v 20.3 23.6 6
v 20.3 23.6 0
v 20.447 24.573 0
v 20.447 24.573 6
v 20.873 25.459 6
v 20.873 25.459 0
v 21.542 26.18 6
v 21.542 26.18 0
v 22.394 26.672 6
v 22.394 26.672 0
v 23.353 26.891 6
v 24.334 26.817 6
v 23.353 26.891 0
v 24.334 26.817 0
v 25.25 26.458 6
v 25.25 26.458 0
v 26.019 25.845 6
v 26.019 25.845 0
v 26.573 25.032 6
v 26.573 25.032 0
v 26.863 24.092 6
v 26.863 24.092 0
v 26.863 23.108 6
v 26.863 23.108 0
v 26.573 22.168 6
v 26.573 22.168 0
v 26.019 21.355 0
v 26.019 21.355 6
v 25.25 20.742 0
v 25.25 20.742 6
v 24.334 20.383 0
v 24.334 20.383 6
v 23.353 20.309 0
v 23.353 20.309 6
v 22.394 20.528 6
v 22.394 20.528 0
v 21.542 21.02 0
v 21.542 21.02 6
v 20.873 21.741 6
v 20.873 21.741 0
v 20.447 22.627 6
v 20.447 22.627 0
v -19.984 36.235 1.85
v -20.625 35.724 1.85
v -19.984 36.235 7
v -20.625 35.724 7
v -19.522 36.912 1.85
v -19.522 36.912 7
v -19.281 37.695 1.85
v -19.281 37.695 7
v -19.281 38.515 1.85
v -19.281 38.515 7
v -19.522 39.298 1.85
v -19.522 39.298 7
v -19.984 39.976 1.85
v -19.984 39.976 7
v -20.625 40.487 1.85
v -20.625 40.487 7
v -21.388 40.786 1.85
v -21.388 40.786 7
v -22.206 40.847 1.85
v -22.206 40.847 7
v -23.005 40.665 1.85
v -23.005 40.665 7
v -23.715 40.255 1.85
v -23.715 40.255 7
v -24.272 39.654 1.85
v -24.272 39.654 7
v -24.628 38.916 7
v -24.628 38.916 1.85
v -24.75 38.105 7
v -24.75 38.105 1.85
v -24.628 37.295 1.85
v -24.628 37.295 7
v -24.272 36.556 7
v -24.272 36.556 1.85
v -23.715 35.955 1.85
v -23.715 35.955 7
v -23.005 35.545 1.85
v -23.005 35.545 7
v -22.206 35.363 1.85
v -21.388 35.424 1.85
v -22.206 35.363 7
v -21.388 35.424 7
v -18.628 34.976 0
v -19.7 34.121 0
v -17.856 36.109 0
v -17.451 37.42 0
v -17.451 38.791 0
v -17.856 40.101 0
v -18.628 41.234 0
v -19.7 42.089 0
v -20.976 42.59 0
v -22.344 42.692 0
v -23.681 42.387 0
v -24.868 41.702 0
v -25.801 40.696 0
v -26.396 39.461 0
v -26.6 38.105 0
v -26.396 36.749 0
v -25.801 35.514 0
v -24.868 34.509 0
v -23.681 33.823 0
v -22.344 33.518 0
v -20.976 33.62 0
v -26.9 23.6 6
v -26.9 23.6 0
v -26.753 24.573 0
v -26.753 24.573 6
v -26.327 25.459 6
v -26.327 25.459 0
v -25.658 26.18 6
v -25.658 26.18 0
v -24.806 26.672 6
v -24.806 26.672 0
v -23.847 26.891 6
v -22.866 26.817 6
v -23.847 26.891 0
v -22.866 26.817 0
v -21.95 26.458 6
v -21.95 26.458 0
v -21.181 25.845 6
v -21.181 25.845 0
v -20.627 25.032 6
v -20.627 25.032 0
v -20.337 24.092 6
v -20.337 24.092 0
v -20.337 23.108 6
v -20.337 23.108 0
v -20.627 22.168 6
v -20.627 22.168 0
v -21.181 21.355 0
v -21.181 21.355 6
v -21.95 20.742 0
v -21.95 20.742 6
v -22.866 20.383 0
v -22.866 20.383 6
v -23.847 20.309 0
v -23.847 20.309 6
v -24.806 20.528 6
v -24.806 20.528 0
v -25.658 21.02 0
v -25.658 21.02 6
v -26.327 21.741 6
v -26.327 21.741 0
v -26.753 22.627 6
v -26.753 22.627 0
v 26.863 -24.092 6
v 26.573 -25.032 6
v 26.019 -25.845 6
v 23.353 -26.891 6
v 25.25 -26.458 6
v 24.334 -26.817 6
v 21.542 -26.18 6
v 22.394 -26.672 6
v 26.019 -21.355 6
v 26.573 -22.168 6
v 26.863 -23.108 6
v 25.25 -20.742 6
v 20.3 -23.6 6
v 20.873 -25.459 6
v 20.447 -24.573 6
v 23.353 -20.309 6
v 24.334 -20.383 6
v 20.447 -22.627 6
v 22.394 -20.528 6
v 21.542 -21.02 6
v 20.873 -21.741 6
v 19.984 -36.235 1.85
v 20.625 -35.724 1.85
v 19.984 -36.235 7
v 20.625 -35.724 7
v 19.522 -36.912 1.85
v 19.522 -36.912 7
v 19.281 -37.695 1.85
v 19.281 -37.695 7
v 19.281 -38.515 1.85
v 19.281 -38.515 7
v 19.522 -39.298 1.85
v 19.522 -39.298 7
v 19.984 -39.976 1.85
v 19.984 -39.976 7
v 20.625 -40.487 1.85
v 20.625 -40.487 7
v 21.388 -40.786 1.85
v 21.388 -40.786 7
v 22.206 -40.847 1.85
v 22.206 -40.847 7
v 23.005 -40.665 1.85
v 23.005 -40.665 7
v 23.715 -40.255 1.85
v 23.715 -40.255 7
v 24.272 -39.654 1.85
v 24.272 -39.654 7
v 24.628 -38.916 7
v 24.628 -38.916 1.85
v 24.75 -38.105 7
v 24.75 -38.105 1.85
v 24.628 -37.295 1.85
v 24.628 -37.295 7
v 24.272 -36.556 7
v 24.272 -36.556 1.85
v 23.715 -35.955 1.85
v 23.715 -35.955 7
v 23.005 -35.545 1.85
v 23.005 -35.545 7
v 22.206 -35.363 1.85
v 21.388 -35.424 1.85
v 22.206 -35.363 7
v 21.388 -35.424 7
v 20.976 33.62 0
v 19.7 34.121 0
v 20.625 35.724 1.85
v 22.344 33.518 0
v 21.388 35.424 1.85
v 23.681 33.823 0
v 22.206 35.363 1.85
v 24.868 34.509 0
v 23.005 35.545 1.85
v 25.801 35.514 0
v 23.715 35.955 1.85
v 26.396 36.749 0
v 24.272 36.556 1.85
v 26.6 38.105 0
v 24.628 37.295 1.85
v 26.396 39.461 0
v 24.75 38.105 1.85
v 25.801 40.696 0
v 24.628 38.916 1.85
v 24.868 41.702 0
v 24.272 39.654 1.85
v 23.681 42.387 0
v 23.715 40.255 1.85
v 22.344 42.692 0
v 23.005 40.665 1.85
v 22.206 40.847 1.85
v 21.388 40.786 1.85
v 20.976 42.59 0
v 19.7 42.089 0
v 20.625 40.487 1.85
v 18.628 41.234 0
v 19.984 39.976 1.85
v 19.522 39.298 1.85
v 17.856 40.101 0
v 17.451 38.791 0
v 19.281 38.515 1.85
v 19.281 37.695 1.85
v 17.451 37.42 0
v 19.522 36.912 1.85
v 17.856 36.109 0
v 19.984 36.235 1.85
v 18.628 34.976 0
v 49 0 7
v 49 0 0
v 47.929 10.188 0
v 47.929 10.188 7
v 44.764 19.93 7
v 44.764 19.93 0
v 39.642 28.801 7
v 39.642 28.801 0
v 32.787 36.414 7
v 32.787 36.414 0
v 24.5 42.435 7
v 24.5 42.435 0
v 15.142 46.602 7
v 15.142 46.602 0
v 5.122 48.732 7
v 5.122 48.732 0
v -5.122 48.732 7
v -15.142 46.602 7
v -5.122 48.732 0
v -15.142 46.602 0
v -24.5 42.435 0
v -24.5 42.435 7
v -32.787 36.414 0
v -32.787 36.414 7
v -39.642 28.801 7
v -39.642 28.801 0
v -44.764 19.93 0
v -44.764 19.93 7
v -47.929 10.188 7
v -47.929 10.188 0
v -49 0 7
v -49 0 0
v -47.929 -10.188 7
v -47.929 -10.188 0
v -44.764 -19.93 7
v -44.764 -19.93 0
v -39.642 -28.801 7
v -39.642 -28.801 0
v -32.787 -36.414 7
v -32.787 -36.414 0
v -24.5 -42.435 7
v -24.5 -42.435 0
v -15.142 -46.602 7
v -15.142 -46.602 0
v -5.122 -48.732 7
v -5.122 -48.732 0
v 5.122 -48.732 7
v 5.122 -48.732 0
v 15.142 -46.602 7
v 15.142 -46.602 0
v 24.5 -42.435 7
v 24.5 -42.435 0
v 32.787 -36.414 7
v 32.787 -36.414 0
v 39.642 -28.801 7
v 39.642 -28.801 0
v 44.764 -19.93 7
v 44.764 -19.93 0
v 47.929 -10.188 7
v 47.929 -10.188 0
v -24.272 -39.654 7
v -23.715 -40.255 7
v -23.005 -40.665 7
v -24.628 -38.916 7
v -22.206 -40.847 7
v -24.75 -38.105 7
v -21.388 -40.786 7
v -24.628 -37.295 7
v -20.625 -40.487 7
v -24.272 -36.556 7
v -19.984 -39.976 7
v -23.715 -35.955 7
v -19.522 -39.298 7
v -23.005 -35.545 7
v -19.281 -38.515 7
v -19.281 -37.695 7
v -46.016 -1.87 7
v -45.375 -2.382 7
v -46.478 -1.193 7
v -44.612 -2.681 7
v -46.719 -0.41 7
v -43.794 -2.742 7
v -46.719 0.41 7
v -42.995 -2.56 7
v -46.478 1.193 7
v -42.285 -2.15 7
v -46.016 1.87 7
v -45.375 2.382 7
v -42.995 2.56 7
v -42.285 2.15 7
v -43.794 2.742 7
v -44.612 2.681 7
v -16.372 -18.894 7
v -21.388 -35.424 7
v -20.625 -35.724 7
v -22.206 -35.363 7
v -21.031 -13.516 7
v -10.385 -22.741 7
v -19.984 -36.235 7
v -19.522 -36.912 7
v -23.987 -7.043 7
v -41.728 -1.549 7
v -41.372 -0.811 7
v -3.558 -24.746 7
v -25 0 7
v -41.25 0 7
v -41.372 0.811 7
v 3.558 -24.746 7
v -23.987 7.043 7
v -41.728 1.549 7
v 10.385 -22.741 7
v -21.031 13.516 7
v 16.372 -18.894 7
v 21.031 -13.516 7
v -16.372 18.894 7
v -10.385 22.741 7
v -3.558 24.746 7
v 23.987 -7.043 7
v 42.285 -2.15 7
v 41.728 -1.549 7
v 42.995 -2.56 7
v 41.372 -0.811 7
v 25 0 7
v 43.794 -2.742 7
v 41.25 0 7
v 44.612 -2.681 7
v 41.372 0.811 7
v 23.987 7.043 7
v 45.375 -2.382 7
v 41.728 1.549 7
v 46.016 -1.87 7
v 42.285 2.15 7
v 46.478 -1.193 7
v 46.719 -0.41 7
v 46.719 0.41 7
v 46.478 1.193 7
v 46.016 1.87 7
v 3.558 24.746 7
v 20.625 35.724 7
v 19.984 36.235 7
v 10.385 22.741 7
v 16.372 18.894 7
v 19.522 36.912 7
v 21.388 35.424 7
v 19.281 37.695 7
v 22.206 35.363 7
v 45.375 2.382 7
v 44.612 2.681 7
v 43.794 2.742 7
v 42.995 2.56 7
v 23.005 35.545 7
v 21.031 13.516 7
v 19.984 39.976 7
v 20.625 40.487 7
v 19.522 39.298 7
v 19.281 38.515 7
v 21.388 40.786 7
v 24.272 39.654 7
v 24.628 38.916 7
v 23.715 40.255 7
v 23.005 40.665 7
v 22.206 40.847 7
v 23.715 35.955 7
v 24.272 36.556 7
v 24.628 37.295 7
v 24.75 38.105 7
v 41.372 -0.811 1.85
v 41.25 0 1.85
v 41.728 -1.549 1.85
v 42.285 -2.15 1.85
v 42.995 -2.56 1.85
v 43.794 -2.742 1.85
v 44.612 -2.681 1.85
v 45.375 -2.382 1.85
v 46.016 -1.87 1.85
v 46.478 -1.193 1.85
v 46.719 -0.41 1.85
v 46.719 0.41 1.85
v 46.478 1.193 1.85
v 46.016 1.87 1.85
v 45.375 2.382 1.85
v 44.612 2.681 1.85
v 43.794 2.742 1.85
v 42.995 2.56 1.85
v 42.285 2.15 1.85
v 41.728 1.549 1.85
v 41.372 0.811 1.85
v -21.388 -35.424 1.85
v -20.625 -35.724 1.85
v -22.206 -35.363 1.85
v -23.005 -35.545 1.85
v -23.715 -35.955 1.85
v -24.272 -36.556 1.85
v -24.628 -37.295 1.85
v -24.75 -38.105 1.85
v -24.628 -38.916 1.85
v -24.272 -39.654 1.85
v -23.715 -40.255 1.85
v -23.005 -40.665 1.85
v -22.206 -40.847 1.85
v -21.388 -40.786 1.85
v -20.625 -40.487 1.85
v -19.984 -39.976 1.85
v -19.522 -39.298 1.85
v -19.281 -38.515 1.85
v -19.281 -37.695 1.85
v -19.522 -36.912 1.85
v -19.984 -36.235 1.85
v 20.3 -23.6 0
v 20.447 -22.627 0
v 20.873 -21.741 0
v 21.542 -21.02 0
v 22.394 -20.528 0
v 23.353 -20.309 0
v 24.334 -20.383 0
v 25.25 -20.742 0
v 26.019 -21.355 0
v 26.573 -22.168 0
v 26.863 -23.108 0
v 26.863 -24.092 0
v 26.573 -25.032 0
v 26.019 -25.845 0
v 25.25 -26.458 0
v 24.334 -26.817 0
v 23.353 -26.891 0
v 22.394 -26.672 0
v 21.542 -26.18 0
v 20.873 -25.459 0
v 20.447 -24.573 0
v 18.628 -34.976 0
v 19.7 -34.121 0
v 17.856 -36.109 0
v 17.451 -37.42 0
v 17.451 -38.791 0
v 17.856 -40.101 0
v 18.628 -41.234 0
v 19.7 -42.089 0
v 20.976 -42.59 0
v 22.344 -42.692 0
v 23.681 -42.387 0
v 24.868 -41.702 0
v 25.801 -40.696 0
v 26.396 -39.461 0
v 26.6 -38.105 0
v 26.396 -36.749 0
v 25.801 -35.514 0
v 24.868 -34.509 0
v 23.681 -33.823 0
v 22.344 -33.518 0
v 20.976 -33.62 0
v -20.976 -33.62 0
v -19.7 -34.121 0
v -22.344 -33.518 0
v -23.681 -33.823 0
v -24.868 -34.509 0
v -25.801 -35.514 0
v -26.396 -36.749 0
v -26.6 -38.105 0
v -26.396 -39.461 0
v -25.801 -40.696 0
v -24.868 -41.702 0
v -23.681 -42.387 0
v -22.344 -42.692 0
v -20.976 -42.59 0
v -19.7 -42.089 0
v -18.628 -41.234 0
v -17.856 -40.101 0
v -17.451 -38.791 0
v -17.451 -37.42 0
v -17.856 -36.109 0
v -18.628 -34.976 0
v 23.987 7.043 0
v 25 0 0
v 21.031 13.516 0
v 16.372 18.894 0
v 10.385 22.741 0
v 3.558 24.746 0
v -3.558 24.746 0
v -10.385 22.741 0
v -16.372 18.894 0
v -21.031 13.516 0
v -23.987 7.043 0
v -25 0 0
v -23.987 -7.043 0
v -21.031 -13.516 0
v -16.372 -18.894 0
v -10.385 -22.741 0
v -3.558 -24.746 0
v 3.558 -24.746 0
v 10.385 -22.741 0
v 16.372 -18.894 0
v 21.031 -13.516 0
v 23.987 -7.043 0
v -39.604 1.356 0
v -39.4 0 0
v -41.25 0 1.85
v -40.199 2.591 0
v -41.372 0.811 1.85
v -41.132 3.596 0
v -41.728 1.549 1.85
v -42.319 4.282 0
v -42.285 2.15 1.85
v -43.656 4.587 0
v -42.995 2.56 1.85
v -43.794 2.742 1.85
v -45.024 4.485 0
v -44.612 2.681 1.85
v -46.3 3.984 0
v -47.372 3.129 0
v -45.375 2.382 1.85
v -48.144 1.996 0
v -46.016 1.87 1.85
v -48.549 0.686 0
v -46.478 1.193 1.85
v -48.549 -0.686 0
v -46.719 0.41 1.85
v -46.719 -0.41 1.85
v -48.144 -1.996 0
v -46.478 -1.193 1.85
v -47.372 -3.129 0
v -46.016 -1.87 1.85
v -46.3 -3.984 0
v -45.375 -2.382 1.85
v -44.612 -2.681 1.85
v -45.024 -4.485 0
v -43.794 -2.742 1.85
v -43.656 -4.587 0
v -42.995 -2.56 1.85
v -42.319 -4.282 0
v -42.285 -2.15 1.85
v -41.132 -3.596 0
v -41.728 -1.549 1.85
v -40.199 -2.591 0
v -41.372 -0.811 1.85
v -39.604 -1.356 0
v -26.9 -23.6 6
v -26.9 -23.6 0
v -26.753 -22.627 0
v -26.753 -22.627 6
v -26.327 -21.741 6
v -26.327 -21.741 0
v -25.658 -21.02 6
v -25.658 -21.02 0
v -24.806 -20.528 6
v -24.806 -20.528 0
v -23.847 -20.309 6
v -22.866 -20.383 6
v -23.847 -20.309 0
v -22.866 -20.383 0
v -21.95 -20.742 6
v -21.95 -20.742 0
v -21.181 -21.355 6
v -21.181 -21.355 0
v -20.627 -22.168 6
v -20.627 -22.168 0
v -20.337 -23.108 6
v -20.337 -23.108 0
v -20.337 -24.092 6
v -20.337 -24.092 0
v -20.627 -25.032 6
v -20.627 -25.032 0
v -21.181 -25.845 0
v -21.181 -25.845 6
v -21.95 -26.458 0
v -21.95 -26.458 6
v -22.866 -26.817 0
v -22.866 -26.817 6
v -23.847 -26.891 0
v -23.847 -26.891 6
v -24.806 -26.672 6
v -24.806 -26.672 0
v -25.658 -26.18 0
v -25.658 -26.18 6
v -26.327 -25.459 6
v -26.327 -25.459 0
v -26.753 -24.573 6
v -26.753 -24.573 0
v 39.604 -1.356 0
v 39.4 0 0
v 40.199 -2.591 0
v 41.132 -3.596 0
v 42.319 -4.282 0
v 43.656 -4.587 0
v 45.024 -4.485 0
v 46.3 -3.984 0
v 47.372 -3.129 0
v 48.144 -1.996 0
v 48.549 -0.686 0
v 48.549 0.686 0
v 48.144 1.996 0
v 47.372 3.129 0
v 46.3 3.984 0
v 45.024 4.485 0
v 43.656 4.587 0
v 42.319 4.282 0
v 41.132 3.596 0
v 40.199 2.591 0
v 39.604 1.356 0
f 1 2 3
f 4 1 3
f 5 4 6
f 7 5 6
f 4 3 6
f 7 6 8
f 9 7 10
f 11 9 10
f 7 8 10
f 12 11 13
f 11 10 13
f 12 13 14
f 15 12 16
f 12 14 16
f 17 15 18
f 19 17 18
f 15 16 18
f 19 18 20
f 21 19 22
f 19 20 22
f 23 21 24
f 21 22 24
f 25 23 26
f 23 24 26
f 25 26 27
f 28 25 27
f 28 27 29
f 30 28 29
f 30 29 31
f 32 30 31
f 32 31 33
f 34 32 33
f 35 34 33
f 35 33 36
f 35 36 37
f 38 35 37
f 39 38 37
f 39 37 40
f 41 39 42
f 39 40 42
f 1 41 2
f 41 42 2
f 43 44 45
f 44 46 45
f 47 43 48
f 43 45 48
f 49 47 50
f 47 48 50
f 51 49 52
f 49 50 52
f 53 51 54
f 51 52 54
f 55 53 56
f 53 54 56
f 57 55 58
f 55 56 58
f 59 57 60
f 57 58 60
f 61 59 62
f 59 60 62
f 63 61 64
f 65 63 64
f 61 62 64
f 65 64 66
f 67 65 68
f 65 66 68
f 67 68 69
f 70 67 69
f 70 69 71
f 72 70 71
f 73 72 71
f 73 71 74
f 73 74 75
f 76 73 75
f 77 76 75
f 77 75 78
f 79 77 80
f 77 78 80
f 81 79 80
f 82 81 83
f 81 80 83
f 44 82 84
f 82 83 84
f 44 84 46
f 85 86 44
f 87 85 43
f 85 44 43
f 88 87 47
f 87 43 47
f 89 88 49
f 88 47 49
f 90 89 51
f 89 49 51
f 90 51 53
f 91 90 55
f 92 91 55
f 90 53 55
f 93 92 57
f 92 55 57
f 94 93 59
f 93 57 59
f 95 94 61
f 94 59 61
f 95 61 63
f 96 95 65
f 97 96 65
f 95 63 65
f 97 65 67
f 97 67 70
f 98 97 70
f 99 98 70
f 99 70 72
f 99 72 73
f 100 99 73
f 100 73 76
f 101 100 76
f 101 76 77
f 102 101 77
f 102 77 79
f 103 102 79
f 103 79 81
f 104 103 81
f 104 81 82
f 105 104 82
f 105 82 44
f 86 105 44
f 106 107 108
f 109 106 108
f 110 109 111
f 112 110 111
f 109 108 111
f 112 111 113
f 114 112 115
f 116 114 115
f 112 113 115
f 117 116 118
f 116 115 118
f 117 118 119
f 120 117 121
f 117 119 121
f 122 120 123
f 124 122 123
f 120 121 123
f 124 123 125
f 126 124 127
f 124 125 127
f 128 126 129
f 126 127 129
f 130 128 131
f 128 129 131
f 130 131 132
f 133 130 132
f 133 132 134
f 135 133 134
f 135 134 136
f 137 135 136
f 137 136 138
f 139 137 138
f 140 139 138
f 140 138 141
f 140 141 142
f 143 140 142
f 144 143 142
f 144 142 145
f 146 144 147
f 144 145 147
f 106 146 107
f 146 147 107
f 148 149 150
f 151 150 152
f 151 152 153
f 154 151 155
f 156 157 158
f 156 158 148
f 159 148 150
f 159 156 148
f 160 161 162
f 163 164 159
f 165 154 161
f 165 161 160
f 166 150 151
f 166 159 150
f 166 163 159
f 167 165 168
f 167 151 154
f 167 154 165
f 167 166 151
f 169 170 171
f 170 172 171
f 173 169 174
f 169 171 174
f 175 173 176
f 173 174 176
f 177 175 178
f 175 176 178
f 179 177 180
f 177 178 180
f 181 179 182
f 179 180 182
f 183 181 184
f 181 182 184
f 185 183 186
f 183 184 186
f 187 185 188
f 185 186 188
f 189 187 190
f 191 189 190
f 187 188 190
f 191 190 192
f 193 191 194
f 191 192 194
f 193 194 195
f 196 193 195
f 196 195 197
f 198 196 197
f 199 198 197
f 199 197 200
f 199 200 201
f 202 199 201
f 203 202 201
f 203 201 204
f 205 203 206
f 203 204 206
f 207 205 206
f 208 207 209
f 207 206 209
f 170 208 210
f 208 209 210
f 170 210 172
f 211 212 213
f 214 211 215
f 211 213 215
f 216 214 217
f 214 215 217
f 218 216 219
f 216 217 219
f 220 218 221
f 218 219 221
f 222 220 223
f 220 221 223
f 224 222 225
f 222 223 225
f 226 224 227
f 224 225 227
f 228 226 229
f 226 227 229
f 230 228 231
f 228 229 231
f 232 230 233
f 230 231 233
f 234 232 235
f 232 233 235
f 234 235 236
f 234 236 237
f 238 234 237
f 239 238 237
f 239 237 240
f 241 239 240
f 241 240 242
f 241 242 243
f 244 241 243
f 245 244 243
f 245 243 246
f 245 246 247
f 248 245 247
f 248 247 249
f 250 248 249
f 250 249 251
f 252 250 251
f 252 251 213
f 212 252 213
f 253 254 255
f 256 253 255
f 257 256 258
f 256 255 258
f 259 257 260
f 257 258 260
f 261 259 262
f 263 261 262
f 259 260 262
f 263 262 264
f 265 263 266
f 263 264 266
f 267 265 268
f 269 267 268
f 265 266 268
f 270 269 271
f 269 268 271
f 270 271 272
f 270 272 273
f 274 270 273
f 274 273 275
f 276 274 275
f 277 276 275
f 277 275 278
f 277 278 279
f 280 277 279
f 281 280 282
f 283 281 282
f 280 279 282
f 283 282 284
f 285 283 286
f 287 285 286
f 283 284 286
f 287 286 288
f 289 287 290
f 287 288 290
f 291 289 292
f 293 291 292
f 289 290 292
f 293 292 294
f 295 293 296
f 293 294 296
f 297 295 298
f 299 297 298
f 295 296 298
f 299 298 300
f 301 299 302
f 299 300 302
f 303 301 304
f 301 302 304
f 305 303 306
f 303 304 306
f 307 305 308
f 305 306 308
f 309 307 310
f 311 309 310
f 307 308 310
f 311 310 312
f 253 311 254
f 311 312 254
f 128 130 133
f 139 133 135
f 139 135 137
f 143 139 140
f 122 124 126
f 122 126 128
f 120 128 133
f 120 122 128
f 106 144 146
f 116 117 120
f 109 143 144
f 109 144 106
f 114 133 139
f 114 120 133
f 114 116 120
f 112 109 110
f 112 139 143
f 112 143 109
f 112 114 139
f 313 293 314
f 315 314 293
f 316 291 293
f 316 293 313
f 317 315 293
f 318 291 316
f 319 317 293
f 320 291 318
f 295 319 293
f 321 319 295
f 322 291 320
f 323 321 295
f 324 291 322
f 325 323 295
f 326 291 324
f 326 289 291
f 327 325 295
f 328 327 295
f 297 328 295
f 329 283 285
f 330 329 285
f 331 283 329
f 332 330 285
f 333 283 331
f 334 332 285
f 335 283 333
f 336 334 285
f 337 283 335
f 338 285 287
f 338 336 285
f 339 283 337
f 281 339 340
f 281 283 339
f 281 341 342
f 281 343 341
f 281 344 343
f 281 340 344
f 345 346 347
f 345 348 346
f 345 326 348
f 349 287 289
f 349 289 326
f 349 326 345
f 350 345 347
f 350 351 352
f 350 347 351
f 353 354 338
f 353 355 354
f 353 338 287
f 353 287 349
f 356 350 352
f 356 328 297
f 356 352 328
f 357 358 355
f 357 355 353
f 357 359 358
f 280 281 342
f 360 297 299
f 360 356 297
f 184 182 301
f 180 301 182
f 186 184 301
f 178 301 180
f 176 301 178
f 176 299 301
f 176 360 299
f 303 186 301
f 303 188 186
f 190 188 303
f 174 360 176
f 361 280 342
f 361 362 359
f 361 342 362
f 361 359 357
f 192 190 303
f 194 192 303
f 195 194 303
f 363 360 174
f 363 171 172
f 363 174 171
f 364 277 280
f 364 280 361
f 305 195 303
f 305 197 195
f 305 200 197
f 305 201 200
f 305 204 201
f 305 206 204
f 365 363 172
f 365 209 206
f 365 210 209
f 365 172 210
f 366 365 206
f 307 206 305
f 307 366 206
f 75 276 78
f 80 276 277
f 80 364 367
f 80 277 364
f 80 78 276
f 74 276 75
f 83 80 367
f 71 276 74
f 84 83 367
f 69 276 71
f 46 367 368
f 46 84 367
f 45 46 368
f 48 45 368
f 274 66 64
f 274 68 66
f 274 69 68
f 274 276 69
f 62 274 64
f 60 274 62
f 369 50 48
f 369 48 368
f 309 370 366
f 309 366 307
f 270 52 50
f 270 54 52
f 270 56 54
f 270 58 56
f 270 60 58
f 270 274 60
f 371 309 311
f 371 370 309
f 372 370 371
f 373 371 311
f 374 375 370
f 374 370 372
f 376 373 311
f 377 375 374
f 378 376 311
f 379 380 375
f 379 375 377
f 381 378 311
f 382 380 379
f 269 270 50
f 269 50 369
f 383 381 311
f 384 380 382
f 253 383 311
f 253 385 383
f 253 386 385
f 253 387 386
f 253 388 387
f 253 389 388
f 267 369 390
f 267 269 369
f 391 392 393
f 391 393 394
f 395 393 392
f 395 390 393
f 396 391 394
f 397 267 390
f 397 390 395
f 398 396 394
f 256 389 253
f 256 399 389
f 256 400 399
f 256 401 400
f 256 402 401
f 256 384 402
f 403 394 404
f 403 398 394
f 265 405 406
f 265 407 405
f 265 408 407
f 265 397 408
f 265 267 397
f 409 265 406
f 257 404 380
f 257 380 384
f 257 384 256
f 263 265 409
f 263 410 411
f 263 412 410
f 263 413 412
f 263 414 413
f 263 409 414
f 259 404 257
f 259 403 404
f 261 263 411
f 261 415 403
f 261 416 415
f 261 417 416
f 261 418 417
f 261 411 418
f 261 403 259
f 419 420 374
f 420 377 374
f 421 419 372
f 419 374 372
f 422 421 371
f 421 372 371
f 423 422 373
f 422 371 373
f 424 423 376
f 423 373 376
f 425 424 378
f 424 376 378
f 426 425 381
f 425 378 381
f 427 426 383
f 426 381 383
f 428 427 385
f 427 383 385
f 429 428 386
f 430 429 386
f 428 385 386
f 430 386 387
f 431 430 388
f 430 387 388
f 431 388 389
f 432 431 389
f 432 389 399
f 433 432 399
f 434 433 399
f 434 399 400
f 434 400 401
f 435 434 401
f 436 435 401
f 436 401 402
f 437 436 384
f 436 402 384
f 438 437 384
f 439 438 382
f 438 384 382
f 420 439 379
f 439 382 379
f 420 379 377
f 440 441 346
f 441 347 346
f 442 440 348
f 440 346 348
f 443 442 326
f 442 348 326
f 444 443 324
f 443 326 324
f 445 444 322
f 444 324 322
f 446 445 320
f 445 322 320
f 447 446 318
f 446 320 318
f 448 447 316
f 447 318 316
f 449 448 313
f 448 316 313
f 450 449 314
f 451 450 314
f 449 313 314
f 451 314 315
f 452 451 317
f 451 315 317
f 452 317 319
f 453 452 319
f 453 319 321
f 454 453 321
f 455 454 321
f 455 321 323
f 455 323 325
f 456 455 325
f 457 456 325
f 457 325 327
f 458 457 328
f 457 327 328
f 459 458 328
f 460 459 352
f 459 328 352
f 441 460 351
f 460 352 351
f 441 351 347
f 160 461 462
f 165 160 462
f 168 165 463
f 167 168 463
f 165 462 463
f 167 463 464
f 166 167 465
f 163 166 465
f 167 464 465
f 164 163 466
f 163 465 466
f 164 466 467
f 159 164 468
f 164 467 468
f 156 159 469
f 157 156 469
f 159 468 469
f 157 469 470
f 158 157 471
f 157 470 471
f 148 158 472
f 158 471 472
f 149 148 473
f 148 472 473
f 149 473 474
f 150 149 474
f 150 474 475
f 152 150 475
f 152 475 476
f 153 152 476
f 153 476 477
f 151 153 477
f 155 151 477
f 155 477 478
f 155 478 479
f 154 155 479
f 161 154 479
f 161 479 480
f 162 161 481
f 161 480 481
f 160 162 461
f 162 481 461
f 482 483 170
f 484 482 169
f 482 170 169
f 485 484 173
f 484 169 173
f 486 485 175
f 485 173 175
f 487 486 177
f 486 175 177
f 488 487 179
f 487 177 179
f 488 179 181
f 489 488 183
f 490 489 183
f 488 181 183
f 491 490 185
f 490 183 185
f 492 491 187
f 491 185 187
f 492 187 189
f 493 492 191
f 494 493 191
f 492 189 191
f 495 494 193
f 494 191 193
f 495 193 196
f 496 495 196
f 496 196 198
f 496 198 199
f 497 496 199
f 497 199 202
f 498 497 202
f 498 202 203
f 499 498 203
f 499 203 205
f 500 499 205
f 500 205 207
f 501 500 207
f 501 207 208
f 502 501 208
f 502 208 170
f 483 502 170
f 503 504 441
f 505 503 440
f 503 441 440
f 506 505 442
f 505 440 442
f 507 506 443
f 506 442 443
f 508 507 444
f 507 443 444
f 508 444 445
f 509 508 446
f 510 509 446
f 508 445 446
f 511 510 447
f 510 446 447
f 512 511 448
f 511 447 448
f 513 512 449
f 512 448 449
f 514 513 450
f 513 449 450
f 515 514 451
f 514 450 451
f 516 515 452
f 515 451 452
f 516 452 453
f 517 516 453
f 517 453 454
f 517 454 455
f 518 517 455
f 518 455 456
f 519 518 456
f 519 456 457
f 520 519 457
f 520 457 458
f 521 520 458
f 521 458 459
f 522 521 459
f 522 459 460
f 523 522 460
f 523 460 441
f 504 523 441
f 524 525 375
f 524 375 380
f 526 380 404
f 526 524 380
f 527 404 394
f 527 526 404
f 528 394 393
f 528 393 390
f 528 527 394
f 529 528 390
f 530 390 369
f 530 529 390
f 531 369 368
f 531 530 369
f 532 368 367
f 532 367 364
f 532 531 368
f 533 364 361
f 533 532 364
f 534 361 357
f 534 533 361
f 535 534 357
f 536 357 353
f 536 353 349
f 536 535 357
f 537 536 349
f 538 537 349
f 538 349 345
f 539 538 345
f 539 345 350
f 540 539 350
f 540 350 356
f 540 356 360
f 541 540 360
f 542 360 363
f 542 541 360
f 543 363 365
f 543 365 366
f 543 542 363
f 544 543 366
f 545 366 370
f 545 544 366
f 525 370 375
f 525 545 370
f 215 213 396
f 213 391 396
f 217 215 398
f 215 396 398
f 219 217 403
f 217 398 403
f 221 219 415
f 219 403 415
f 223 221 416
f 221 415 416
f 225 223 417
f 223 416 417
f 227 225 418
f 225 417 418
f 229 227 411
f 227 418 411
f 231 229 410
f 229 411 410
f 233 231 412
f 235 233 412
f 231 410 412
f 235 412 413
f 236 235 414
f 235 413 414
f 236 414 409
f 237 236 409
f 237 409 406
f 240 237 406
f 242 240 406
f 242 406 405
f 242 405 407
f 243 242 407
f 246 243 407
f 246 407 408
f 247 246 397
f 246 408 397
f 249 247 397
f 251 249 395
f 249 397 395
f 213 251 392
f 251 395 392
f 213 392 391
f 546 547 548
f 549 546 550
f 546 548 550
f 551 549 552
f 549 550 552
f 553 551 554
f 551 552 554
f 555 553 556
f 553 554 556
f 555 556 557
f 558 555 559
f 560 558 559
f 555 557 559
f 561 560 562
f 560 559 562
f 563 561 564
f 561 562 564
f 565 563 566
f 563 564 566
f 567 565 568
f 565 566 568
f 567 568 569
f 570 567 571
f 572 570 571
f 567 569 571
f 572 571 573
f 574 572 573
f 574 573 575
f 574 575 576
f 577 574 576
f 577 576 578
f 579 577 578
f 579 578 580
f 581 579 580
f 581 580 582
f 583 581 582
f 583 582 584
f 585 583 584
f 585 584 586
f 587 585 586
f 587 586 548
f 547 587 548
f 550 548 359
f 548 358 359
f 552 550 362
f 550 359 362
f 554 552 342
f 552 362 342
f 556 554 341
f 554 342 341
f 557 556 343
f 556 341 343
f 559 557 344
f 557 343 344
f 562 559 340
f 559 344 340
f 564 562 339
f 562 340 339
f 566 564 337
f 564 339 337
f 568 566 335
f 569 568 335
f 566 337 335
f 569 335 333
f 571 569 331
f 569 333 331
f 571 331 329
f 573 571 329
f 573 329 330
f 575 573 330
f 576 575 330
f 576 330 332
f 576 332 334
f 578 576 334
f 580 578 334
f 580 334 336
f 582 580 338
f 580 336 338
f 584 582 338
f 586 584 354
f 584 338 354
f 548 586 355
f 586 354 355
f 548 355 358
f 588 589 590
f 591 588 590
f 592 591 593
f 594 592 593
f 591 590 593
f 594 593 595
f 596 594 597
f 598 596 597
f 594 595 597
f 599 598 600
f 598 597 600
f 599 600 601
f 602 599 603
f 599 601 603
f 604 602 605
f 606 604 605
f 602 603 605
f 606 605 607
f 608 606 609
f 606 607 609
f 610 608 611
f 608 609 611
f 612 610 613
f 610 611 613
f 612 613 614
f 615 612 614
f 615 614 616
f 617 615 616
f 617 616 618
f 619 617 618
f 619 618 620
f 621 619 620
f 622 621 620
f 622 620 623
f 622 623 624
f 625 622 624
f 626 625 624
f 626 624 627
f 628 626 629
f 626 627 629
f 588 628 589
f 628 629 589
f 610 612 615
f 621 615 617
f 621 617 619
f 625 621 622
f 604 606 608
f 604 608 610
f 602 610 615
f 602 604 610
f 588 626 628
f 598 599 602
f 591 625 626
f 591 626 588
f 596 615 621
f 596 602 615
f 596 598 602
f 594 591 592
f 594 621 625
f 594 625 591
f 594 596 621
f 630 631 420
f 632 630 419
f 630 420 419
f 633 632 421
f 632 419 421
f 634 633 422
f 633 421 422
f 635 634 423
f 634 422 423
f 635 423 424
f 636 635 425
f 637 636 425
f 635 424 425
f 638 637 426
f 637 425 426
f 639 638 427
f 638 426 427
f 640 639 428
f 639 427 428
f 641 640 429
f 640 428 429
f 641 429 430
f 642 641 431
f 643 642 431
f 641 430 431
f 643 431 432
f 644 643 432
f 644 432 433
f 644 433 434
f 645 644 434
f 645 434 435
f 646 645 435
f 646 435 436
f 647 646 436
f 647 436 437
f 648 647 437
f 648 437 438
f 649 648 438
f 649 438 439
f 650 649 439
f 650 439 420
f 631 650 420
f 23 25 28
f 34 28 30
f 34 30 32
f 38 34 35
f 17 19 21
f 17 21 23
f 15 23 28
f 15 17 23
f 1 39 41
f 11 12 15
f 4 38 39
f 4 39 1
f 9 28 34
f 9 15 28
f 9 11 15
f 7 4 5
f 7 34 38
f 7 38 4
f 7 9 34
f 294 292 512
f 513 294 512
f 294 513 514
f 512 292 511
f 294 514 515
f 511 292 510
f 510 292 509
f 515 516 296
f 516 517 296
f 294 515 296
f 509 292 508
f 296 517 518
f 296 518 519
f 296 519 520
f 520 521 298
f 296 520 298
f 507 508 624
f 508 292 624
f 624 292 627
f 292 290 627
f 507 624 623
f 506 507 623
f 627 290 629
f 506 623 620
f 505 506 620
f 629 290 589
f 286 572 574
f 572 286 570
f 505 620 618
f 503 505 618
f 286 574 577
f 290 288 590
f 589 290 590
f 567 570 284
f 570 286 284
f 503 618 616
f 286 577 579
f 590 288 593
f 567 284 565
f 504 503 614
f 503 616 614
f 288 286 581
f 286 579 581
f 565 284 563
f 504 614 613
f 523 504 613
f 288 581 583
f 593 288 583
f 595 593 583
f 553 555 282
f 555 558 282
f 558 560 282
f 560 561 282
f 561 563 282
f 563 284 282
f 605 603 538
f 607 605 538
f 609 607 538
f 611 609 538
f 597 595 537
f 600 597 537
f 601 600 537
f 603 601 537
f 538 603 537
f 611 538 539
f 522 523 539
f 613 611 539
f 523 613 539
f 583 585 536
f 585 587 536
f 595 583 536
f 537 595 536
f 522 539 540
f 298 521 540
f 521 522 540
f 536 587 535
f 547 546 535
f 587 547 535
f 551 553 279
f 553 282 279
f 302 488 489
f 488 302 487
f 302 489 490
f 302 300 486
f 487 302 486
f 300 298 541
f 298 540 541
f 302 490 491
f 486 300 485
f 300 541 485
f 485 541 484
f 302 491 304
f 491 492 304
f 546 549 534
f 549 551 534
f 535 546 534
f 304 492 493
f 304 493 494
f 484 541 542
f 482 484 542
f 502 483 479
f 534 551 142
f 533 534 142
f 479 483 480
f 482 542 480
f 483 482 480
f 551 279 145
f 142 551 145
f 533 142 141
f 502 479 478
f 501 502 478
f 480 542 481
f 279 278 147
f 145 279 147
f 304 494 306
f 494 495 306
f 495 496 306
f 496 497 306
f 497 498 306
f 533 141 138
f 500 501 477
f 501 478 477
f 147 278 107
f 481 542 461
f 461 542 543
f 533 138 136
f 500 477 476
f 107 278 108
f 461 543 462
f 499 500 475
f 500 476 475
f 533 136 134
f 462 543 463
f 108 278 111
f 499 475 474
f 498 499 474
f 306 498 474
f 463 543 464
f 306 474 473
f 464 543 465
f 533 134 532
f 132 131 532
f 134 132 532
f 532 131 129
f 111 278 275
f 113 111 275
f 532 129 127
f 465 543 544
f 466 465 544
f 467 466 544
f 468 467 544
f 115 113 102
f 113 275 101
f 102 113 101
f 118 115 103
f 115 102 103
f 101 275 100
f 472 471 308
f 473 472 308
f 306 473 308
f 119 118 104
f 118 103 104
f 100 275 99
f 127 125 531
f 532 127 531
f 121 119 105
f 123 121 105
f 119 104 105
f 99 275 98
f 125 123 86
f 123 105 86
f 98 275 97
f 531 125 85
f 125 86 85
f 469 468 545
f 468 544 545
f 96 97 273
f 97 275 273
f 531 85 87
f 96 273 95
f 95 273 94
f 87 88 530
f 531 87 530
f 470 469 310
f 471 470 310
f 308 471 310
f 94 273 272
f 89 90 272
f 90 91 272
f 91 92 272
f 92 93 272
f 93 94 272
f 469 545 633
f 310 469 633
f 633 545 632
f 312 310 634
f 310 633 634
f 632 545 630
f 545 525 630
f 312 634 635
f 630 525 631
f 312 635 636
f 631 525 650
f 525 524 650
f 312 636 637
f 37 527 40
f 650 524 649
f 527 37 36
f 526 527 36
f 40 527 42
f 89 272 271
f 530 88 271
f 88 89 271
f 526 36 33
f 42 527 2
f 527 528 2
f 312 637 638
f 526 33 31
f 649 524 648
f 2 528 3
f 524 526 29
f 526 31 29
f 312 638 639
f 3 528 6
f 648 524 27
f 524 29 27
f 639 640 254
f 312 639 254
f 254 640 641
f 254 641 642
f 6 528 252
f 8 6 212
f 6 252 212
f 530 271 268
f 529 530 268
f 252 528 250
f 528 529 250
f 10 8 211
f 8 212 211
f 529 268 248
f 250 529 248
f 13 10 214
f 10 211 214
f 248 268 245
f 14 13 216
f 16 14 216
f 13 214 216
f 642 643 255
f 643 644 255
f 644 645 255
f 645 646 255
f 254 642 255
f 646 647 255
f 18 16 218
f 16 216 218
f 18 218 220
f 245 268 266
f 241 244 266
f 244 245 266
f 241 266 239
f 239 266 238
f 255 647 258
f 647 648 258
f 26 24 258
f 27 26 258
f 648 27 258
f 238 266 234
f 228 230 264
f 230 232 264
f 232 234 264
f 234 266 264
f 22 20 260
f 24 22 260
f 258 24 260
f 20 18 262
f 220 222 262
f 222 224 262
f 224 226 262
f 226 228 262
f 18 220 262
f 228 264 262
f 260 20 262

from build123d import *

# Parameters (mm, degrees)
SZKIC1_R                                            = 49
SZKIC1_R_2                                          = 25
DODANIE_WYCI_GNI_CIE1_DEPTH                         = 7
POG_BIENIE_STO_KOWE_POD_M5_DIN965_WKR_T_D           = 5.5
POG_BIENIE_STO_KOWE_POD_M5_DIN965_WKR_T_CSINK_D     = 9.2
POG_BIENIE_STO_KOWE_POD_M5_DIN965_WKR_T_CSINK_ANGLE = 90
SZYK_KO_OWY1_COUNT                                  = 6
SZKIC5_R                                            = 3.3
WYTNIJ_WYCI_GNI_CIE1_DEPTH                          = 6


with BuildPart() as part:
    # Szkic1 → Dodanie-wyciągnięcie1 (new body)
    with BuildSketch(Plane.XY):
        Circle(SZKIC1_R)
        Circle(SZKIC1_R_2, mode=Mode.SUBTRACT)
    extrude(amount=DODANIE_WYCI_GNI_CIE1_DEPTH)

    # Pogłębienie stożkowe pod M5 DIN965 Wkręt z łbem płaskim1 (through all)
    with Locations(Plane(origin=(0, 0, 0), x_dir=(-1, 0, 0), z_dir=(0, 0, -1))):
        with Locations((44, 0)):
            pog_bienie_sto_kowe_pod_m5_din965_wkr_t = CounterSinkHole(POG_BIENIE_STO_KOWE_POD_M5_DIN965_WKR_T_D / 2, POG_BIENIE_STO_KOWE_POD_M5_DIN965_WKR_T_CSINK_D / 2, counter_sink_angle=POG_BIENIE_STO_KOWE_POD_M5_DIN965_WKR_T_CSINK_ANGLE)

    # Szyk kołowy1: Pogłębienie stożkowe pod M5 DIN965 Wkręt z łbem płaskim1 ×6 about axis
    szyk_ko_owy1_axis = Axis((0, 0, 0), (0, 0, 1))
    for i in range(1, SZYK_KO_OWY1_COUNT):
        add(pog_bienie_sto_kowe_pod_m5_din965_wkr_t.rotate(szyk_ko_owy1_axis, i * 360 / SZYK_KO_OWY1_COUNT), mode=Mode.SUBTRACT)

    # Szkic5 → Wytnij-wyciągnięcie1 (cut)
    with BuildSketch(Plane(origin=(0, 0, 0), x_dir=(-1, 0, 0), z_dir=(0, 0, -1))):
        with Locations((23.6, 23.6)):
            Circle(SZKIC5_R)
        with Locations((23.6, -23.6)):
            Circle(SZKIC5_R)
        with Locations((-23.6, 23.6)):
            Circle(SZKIC5_R)
        with Locations((-23.6, -23.6)):
            Circle(SZKIC5_R)
    extrude(amount=-WYTNIJ_WYCI_GNI_CIE1_DEPTH, mode=Mode.SUBTRACT)


solid = part.part
